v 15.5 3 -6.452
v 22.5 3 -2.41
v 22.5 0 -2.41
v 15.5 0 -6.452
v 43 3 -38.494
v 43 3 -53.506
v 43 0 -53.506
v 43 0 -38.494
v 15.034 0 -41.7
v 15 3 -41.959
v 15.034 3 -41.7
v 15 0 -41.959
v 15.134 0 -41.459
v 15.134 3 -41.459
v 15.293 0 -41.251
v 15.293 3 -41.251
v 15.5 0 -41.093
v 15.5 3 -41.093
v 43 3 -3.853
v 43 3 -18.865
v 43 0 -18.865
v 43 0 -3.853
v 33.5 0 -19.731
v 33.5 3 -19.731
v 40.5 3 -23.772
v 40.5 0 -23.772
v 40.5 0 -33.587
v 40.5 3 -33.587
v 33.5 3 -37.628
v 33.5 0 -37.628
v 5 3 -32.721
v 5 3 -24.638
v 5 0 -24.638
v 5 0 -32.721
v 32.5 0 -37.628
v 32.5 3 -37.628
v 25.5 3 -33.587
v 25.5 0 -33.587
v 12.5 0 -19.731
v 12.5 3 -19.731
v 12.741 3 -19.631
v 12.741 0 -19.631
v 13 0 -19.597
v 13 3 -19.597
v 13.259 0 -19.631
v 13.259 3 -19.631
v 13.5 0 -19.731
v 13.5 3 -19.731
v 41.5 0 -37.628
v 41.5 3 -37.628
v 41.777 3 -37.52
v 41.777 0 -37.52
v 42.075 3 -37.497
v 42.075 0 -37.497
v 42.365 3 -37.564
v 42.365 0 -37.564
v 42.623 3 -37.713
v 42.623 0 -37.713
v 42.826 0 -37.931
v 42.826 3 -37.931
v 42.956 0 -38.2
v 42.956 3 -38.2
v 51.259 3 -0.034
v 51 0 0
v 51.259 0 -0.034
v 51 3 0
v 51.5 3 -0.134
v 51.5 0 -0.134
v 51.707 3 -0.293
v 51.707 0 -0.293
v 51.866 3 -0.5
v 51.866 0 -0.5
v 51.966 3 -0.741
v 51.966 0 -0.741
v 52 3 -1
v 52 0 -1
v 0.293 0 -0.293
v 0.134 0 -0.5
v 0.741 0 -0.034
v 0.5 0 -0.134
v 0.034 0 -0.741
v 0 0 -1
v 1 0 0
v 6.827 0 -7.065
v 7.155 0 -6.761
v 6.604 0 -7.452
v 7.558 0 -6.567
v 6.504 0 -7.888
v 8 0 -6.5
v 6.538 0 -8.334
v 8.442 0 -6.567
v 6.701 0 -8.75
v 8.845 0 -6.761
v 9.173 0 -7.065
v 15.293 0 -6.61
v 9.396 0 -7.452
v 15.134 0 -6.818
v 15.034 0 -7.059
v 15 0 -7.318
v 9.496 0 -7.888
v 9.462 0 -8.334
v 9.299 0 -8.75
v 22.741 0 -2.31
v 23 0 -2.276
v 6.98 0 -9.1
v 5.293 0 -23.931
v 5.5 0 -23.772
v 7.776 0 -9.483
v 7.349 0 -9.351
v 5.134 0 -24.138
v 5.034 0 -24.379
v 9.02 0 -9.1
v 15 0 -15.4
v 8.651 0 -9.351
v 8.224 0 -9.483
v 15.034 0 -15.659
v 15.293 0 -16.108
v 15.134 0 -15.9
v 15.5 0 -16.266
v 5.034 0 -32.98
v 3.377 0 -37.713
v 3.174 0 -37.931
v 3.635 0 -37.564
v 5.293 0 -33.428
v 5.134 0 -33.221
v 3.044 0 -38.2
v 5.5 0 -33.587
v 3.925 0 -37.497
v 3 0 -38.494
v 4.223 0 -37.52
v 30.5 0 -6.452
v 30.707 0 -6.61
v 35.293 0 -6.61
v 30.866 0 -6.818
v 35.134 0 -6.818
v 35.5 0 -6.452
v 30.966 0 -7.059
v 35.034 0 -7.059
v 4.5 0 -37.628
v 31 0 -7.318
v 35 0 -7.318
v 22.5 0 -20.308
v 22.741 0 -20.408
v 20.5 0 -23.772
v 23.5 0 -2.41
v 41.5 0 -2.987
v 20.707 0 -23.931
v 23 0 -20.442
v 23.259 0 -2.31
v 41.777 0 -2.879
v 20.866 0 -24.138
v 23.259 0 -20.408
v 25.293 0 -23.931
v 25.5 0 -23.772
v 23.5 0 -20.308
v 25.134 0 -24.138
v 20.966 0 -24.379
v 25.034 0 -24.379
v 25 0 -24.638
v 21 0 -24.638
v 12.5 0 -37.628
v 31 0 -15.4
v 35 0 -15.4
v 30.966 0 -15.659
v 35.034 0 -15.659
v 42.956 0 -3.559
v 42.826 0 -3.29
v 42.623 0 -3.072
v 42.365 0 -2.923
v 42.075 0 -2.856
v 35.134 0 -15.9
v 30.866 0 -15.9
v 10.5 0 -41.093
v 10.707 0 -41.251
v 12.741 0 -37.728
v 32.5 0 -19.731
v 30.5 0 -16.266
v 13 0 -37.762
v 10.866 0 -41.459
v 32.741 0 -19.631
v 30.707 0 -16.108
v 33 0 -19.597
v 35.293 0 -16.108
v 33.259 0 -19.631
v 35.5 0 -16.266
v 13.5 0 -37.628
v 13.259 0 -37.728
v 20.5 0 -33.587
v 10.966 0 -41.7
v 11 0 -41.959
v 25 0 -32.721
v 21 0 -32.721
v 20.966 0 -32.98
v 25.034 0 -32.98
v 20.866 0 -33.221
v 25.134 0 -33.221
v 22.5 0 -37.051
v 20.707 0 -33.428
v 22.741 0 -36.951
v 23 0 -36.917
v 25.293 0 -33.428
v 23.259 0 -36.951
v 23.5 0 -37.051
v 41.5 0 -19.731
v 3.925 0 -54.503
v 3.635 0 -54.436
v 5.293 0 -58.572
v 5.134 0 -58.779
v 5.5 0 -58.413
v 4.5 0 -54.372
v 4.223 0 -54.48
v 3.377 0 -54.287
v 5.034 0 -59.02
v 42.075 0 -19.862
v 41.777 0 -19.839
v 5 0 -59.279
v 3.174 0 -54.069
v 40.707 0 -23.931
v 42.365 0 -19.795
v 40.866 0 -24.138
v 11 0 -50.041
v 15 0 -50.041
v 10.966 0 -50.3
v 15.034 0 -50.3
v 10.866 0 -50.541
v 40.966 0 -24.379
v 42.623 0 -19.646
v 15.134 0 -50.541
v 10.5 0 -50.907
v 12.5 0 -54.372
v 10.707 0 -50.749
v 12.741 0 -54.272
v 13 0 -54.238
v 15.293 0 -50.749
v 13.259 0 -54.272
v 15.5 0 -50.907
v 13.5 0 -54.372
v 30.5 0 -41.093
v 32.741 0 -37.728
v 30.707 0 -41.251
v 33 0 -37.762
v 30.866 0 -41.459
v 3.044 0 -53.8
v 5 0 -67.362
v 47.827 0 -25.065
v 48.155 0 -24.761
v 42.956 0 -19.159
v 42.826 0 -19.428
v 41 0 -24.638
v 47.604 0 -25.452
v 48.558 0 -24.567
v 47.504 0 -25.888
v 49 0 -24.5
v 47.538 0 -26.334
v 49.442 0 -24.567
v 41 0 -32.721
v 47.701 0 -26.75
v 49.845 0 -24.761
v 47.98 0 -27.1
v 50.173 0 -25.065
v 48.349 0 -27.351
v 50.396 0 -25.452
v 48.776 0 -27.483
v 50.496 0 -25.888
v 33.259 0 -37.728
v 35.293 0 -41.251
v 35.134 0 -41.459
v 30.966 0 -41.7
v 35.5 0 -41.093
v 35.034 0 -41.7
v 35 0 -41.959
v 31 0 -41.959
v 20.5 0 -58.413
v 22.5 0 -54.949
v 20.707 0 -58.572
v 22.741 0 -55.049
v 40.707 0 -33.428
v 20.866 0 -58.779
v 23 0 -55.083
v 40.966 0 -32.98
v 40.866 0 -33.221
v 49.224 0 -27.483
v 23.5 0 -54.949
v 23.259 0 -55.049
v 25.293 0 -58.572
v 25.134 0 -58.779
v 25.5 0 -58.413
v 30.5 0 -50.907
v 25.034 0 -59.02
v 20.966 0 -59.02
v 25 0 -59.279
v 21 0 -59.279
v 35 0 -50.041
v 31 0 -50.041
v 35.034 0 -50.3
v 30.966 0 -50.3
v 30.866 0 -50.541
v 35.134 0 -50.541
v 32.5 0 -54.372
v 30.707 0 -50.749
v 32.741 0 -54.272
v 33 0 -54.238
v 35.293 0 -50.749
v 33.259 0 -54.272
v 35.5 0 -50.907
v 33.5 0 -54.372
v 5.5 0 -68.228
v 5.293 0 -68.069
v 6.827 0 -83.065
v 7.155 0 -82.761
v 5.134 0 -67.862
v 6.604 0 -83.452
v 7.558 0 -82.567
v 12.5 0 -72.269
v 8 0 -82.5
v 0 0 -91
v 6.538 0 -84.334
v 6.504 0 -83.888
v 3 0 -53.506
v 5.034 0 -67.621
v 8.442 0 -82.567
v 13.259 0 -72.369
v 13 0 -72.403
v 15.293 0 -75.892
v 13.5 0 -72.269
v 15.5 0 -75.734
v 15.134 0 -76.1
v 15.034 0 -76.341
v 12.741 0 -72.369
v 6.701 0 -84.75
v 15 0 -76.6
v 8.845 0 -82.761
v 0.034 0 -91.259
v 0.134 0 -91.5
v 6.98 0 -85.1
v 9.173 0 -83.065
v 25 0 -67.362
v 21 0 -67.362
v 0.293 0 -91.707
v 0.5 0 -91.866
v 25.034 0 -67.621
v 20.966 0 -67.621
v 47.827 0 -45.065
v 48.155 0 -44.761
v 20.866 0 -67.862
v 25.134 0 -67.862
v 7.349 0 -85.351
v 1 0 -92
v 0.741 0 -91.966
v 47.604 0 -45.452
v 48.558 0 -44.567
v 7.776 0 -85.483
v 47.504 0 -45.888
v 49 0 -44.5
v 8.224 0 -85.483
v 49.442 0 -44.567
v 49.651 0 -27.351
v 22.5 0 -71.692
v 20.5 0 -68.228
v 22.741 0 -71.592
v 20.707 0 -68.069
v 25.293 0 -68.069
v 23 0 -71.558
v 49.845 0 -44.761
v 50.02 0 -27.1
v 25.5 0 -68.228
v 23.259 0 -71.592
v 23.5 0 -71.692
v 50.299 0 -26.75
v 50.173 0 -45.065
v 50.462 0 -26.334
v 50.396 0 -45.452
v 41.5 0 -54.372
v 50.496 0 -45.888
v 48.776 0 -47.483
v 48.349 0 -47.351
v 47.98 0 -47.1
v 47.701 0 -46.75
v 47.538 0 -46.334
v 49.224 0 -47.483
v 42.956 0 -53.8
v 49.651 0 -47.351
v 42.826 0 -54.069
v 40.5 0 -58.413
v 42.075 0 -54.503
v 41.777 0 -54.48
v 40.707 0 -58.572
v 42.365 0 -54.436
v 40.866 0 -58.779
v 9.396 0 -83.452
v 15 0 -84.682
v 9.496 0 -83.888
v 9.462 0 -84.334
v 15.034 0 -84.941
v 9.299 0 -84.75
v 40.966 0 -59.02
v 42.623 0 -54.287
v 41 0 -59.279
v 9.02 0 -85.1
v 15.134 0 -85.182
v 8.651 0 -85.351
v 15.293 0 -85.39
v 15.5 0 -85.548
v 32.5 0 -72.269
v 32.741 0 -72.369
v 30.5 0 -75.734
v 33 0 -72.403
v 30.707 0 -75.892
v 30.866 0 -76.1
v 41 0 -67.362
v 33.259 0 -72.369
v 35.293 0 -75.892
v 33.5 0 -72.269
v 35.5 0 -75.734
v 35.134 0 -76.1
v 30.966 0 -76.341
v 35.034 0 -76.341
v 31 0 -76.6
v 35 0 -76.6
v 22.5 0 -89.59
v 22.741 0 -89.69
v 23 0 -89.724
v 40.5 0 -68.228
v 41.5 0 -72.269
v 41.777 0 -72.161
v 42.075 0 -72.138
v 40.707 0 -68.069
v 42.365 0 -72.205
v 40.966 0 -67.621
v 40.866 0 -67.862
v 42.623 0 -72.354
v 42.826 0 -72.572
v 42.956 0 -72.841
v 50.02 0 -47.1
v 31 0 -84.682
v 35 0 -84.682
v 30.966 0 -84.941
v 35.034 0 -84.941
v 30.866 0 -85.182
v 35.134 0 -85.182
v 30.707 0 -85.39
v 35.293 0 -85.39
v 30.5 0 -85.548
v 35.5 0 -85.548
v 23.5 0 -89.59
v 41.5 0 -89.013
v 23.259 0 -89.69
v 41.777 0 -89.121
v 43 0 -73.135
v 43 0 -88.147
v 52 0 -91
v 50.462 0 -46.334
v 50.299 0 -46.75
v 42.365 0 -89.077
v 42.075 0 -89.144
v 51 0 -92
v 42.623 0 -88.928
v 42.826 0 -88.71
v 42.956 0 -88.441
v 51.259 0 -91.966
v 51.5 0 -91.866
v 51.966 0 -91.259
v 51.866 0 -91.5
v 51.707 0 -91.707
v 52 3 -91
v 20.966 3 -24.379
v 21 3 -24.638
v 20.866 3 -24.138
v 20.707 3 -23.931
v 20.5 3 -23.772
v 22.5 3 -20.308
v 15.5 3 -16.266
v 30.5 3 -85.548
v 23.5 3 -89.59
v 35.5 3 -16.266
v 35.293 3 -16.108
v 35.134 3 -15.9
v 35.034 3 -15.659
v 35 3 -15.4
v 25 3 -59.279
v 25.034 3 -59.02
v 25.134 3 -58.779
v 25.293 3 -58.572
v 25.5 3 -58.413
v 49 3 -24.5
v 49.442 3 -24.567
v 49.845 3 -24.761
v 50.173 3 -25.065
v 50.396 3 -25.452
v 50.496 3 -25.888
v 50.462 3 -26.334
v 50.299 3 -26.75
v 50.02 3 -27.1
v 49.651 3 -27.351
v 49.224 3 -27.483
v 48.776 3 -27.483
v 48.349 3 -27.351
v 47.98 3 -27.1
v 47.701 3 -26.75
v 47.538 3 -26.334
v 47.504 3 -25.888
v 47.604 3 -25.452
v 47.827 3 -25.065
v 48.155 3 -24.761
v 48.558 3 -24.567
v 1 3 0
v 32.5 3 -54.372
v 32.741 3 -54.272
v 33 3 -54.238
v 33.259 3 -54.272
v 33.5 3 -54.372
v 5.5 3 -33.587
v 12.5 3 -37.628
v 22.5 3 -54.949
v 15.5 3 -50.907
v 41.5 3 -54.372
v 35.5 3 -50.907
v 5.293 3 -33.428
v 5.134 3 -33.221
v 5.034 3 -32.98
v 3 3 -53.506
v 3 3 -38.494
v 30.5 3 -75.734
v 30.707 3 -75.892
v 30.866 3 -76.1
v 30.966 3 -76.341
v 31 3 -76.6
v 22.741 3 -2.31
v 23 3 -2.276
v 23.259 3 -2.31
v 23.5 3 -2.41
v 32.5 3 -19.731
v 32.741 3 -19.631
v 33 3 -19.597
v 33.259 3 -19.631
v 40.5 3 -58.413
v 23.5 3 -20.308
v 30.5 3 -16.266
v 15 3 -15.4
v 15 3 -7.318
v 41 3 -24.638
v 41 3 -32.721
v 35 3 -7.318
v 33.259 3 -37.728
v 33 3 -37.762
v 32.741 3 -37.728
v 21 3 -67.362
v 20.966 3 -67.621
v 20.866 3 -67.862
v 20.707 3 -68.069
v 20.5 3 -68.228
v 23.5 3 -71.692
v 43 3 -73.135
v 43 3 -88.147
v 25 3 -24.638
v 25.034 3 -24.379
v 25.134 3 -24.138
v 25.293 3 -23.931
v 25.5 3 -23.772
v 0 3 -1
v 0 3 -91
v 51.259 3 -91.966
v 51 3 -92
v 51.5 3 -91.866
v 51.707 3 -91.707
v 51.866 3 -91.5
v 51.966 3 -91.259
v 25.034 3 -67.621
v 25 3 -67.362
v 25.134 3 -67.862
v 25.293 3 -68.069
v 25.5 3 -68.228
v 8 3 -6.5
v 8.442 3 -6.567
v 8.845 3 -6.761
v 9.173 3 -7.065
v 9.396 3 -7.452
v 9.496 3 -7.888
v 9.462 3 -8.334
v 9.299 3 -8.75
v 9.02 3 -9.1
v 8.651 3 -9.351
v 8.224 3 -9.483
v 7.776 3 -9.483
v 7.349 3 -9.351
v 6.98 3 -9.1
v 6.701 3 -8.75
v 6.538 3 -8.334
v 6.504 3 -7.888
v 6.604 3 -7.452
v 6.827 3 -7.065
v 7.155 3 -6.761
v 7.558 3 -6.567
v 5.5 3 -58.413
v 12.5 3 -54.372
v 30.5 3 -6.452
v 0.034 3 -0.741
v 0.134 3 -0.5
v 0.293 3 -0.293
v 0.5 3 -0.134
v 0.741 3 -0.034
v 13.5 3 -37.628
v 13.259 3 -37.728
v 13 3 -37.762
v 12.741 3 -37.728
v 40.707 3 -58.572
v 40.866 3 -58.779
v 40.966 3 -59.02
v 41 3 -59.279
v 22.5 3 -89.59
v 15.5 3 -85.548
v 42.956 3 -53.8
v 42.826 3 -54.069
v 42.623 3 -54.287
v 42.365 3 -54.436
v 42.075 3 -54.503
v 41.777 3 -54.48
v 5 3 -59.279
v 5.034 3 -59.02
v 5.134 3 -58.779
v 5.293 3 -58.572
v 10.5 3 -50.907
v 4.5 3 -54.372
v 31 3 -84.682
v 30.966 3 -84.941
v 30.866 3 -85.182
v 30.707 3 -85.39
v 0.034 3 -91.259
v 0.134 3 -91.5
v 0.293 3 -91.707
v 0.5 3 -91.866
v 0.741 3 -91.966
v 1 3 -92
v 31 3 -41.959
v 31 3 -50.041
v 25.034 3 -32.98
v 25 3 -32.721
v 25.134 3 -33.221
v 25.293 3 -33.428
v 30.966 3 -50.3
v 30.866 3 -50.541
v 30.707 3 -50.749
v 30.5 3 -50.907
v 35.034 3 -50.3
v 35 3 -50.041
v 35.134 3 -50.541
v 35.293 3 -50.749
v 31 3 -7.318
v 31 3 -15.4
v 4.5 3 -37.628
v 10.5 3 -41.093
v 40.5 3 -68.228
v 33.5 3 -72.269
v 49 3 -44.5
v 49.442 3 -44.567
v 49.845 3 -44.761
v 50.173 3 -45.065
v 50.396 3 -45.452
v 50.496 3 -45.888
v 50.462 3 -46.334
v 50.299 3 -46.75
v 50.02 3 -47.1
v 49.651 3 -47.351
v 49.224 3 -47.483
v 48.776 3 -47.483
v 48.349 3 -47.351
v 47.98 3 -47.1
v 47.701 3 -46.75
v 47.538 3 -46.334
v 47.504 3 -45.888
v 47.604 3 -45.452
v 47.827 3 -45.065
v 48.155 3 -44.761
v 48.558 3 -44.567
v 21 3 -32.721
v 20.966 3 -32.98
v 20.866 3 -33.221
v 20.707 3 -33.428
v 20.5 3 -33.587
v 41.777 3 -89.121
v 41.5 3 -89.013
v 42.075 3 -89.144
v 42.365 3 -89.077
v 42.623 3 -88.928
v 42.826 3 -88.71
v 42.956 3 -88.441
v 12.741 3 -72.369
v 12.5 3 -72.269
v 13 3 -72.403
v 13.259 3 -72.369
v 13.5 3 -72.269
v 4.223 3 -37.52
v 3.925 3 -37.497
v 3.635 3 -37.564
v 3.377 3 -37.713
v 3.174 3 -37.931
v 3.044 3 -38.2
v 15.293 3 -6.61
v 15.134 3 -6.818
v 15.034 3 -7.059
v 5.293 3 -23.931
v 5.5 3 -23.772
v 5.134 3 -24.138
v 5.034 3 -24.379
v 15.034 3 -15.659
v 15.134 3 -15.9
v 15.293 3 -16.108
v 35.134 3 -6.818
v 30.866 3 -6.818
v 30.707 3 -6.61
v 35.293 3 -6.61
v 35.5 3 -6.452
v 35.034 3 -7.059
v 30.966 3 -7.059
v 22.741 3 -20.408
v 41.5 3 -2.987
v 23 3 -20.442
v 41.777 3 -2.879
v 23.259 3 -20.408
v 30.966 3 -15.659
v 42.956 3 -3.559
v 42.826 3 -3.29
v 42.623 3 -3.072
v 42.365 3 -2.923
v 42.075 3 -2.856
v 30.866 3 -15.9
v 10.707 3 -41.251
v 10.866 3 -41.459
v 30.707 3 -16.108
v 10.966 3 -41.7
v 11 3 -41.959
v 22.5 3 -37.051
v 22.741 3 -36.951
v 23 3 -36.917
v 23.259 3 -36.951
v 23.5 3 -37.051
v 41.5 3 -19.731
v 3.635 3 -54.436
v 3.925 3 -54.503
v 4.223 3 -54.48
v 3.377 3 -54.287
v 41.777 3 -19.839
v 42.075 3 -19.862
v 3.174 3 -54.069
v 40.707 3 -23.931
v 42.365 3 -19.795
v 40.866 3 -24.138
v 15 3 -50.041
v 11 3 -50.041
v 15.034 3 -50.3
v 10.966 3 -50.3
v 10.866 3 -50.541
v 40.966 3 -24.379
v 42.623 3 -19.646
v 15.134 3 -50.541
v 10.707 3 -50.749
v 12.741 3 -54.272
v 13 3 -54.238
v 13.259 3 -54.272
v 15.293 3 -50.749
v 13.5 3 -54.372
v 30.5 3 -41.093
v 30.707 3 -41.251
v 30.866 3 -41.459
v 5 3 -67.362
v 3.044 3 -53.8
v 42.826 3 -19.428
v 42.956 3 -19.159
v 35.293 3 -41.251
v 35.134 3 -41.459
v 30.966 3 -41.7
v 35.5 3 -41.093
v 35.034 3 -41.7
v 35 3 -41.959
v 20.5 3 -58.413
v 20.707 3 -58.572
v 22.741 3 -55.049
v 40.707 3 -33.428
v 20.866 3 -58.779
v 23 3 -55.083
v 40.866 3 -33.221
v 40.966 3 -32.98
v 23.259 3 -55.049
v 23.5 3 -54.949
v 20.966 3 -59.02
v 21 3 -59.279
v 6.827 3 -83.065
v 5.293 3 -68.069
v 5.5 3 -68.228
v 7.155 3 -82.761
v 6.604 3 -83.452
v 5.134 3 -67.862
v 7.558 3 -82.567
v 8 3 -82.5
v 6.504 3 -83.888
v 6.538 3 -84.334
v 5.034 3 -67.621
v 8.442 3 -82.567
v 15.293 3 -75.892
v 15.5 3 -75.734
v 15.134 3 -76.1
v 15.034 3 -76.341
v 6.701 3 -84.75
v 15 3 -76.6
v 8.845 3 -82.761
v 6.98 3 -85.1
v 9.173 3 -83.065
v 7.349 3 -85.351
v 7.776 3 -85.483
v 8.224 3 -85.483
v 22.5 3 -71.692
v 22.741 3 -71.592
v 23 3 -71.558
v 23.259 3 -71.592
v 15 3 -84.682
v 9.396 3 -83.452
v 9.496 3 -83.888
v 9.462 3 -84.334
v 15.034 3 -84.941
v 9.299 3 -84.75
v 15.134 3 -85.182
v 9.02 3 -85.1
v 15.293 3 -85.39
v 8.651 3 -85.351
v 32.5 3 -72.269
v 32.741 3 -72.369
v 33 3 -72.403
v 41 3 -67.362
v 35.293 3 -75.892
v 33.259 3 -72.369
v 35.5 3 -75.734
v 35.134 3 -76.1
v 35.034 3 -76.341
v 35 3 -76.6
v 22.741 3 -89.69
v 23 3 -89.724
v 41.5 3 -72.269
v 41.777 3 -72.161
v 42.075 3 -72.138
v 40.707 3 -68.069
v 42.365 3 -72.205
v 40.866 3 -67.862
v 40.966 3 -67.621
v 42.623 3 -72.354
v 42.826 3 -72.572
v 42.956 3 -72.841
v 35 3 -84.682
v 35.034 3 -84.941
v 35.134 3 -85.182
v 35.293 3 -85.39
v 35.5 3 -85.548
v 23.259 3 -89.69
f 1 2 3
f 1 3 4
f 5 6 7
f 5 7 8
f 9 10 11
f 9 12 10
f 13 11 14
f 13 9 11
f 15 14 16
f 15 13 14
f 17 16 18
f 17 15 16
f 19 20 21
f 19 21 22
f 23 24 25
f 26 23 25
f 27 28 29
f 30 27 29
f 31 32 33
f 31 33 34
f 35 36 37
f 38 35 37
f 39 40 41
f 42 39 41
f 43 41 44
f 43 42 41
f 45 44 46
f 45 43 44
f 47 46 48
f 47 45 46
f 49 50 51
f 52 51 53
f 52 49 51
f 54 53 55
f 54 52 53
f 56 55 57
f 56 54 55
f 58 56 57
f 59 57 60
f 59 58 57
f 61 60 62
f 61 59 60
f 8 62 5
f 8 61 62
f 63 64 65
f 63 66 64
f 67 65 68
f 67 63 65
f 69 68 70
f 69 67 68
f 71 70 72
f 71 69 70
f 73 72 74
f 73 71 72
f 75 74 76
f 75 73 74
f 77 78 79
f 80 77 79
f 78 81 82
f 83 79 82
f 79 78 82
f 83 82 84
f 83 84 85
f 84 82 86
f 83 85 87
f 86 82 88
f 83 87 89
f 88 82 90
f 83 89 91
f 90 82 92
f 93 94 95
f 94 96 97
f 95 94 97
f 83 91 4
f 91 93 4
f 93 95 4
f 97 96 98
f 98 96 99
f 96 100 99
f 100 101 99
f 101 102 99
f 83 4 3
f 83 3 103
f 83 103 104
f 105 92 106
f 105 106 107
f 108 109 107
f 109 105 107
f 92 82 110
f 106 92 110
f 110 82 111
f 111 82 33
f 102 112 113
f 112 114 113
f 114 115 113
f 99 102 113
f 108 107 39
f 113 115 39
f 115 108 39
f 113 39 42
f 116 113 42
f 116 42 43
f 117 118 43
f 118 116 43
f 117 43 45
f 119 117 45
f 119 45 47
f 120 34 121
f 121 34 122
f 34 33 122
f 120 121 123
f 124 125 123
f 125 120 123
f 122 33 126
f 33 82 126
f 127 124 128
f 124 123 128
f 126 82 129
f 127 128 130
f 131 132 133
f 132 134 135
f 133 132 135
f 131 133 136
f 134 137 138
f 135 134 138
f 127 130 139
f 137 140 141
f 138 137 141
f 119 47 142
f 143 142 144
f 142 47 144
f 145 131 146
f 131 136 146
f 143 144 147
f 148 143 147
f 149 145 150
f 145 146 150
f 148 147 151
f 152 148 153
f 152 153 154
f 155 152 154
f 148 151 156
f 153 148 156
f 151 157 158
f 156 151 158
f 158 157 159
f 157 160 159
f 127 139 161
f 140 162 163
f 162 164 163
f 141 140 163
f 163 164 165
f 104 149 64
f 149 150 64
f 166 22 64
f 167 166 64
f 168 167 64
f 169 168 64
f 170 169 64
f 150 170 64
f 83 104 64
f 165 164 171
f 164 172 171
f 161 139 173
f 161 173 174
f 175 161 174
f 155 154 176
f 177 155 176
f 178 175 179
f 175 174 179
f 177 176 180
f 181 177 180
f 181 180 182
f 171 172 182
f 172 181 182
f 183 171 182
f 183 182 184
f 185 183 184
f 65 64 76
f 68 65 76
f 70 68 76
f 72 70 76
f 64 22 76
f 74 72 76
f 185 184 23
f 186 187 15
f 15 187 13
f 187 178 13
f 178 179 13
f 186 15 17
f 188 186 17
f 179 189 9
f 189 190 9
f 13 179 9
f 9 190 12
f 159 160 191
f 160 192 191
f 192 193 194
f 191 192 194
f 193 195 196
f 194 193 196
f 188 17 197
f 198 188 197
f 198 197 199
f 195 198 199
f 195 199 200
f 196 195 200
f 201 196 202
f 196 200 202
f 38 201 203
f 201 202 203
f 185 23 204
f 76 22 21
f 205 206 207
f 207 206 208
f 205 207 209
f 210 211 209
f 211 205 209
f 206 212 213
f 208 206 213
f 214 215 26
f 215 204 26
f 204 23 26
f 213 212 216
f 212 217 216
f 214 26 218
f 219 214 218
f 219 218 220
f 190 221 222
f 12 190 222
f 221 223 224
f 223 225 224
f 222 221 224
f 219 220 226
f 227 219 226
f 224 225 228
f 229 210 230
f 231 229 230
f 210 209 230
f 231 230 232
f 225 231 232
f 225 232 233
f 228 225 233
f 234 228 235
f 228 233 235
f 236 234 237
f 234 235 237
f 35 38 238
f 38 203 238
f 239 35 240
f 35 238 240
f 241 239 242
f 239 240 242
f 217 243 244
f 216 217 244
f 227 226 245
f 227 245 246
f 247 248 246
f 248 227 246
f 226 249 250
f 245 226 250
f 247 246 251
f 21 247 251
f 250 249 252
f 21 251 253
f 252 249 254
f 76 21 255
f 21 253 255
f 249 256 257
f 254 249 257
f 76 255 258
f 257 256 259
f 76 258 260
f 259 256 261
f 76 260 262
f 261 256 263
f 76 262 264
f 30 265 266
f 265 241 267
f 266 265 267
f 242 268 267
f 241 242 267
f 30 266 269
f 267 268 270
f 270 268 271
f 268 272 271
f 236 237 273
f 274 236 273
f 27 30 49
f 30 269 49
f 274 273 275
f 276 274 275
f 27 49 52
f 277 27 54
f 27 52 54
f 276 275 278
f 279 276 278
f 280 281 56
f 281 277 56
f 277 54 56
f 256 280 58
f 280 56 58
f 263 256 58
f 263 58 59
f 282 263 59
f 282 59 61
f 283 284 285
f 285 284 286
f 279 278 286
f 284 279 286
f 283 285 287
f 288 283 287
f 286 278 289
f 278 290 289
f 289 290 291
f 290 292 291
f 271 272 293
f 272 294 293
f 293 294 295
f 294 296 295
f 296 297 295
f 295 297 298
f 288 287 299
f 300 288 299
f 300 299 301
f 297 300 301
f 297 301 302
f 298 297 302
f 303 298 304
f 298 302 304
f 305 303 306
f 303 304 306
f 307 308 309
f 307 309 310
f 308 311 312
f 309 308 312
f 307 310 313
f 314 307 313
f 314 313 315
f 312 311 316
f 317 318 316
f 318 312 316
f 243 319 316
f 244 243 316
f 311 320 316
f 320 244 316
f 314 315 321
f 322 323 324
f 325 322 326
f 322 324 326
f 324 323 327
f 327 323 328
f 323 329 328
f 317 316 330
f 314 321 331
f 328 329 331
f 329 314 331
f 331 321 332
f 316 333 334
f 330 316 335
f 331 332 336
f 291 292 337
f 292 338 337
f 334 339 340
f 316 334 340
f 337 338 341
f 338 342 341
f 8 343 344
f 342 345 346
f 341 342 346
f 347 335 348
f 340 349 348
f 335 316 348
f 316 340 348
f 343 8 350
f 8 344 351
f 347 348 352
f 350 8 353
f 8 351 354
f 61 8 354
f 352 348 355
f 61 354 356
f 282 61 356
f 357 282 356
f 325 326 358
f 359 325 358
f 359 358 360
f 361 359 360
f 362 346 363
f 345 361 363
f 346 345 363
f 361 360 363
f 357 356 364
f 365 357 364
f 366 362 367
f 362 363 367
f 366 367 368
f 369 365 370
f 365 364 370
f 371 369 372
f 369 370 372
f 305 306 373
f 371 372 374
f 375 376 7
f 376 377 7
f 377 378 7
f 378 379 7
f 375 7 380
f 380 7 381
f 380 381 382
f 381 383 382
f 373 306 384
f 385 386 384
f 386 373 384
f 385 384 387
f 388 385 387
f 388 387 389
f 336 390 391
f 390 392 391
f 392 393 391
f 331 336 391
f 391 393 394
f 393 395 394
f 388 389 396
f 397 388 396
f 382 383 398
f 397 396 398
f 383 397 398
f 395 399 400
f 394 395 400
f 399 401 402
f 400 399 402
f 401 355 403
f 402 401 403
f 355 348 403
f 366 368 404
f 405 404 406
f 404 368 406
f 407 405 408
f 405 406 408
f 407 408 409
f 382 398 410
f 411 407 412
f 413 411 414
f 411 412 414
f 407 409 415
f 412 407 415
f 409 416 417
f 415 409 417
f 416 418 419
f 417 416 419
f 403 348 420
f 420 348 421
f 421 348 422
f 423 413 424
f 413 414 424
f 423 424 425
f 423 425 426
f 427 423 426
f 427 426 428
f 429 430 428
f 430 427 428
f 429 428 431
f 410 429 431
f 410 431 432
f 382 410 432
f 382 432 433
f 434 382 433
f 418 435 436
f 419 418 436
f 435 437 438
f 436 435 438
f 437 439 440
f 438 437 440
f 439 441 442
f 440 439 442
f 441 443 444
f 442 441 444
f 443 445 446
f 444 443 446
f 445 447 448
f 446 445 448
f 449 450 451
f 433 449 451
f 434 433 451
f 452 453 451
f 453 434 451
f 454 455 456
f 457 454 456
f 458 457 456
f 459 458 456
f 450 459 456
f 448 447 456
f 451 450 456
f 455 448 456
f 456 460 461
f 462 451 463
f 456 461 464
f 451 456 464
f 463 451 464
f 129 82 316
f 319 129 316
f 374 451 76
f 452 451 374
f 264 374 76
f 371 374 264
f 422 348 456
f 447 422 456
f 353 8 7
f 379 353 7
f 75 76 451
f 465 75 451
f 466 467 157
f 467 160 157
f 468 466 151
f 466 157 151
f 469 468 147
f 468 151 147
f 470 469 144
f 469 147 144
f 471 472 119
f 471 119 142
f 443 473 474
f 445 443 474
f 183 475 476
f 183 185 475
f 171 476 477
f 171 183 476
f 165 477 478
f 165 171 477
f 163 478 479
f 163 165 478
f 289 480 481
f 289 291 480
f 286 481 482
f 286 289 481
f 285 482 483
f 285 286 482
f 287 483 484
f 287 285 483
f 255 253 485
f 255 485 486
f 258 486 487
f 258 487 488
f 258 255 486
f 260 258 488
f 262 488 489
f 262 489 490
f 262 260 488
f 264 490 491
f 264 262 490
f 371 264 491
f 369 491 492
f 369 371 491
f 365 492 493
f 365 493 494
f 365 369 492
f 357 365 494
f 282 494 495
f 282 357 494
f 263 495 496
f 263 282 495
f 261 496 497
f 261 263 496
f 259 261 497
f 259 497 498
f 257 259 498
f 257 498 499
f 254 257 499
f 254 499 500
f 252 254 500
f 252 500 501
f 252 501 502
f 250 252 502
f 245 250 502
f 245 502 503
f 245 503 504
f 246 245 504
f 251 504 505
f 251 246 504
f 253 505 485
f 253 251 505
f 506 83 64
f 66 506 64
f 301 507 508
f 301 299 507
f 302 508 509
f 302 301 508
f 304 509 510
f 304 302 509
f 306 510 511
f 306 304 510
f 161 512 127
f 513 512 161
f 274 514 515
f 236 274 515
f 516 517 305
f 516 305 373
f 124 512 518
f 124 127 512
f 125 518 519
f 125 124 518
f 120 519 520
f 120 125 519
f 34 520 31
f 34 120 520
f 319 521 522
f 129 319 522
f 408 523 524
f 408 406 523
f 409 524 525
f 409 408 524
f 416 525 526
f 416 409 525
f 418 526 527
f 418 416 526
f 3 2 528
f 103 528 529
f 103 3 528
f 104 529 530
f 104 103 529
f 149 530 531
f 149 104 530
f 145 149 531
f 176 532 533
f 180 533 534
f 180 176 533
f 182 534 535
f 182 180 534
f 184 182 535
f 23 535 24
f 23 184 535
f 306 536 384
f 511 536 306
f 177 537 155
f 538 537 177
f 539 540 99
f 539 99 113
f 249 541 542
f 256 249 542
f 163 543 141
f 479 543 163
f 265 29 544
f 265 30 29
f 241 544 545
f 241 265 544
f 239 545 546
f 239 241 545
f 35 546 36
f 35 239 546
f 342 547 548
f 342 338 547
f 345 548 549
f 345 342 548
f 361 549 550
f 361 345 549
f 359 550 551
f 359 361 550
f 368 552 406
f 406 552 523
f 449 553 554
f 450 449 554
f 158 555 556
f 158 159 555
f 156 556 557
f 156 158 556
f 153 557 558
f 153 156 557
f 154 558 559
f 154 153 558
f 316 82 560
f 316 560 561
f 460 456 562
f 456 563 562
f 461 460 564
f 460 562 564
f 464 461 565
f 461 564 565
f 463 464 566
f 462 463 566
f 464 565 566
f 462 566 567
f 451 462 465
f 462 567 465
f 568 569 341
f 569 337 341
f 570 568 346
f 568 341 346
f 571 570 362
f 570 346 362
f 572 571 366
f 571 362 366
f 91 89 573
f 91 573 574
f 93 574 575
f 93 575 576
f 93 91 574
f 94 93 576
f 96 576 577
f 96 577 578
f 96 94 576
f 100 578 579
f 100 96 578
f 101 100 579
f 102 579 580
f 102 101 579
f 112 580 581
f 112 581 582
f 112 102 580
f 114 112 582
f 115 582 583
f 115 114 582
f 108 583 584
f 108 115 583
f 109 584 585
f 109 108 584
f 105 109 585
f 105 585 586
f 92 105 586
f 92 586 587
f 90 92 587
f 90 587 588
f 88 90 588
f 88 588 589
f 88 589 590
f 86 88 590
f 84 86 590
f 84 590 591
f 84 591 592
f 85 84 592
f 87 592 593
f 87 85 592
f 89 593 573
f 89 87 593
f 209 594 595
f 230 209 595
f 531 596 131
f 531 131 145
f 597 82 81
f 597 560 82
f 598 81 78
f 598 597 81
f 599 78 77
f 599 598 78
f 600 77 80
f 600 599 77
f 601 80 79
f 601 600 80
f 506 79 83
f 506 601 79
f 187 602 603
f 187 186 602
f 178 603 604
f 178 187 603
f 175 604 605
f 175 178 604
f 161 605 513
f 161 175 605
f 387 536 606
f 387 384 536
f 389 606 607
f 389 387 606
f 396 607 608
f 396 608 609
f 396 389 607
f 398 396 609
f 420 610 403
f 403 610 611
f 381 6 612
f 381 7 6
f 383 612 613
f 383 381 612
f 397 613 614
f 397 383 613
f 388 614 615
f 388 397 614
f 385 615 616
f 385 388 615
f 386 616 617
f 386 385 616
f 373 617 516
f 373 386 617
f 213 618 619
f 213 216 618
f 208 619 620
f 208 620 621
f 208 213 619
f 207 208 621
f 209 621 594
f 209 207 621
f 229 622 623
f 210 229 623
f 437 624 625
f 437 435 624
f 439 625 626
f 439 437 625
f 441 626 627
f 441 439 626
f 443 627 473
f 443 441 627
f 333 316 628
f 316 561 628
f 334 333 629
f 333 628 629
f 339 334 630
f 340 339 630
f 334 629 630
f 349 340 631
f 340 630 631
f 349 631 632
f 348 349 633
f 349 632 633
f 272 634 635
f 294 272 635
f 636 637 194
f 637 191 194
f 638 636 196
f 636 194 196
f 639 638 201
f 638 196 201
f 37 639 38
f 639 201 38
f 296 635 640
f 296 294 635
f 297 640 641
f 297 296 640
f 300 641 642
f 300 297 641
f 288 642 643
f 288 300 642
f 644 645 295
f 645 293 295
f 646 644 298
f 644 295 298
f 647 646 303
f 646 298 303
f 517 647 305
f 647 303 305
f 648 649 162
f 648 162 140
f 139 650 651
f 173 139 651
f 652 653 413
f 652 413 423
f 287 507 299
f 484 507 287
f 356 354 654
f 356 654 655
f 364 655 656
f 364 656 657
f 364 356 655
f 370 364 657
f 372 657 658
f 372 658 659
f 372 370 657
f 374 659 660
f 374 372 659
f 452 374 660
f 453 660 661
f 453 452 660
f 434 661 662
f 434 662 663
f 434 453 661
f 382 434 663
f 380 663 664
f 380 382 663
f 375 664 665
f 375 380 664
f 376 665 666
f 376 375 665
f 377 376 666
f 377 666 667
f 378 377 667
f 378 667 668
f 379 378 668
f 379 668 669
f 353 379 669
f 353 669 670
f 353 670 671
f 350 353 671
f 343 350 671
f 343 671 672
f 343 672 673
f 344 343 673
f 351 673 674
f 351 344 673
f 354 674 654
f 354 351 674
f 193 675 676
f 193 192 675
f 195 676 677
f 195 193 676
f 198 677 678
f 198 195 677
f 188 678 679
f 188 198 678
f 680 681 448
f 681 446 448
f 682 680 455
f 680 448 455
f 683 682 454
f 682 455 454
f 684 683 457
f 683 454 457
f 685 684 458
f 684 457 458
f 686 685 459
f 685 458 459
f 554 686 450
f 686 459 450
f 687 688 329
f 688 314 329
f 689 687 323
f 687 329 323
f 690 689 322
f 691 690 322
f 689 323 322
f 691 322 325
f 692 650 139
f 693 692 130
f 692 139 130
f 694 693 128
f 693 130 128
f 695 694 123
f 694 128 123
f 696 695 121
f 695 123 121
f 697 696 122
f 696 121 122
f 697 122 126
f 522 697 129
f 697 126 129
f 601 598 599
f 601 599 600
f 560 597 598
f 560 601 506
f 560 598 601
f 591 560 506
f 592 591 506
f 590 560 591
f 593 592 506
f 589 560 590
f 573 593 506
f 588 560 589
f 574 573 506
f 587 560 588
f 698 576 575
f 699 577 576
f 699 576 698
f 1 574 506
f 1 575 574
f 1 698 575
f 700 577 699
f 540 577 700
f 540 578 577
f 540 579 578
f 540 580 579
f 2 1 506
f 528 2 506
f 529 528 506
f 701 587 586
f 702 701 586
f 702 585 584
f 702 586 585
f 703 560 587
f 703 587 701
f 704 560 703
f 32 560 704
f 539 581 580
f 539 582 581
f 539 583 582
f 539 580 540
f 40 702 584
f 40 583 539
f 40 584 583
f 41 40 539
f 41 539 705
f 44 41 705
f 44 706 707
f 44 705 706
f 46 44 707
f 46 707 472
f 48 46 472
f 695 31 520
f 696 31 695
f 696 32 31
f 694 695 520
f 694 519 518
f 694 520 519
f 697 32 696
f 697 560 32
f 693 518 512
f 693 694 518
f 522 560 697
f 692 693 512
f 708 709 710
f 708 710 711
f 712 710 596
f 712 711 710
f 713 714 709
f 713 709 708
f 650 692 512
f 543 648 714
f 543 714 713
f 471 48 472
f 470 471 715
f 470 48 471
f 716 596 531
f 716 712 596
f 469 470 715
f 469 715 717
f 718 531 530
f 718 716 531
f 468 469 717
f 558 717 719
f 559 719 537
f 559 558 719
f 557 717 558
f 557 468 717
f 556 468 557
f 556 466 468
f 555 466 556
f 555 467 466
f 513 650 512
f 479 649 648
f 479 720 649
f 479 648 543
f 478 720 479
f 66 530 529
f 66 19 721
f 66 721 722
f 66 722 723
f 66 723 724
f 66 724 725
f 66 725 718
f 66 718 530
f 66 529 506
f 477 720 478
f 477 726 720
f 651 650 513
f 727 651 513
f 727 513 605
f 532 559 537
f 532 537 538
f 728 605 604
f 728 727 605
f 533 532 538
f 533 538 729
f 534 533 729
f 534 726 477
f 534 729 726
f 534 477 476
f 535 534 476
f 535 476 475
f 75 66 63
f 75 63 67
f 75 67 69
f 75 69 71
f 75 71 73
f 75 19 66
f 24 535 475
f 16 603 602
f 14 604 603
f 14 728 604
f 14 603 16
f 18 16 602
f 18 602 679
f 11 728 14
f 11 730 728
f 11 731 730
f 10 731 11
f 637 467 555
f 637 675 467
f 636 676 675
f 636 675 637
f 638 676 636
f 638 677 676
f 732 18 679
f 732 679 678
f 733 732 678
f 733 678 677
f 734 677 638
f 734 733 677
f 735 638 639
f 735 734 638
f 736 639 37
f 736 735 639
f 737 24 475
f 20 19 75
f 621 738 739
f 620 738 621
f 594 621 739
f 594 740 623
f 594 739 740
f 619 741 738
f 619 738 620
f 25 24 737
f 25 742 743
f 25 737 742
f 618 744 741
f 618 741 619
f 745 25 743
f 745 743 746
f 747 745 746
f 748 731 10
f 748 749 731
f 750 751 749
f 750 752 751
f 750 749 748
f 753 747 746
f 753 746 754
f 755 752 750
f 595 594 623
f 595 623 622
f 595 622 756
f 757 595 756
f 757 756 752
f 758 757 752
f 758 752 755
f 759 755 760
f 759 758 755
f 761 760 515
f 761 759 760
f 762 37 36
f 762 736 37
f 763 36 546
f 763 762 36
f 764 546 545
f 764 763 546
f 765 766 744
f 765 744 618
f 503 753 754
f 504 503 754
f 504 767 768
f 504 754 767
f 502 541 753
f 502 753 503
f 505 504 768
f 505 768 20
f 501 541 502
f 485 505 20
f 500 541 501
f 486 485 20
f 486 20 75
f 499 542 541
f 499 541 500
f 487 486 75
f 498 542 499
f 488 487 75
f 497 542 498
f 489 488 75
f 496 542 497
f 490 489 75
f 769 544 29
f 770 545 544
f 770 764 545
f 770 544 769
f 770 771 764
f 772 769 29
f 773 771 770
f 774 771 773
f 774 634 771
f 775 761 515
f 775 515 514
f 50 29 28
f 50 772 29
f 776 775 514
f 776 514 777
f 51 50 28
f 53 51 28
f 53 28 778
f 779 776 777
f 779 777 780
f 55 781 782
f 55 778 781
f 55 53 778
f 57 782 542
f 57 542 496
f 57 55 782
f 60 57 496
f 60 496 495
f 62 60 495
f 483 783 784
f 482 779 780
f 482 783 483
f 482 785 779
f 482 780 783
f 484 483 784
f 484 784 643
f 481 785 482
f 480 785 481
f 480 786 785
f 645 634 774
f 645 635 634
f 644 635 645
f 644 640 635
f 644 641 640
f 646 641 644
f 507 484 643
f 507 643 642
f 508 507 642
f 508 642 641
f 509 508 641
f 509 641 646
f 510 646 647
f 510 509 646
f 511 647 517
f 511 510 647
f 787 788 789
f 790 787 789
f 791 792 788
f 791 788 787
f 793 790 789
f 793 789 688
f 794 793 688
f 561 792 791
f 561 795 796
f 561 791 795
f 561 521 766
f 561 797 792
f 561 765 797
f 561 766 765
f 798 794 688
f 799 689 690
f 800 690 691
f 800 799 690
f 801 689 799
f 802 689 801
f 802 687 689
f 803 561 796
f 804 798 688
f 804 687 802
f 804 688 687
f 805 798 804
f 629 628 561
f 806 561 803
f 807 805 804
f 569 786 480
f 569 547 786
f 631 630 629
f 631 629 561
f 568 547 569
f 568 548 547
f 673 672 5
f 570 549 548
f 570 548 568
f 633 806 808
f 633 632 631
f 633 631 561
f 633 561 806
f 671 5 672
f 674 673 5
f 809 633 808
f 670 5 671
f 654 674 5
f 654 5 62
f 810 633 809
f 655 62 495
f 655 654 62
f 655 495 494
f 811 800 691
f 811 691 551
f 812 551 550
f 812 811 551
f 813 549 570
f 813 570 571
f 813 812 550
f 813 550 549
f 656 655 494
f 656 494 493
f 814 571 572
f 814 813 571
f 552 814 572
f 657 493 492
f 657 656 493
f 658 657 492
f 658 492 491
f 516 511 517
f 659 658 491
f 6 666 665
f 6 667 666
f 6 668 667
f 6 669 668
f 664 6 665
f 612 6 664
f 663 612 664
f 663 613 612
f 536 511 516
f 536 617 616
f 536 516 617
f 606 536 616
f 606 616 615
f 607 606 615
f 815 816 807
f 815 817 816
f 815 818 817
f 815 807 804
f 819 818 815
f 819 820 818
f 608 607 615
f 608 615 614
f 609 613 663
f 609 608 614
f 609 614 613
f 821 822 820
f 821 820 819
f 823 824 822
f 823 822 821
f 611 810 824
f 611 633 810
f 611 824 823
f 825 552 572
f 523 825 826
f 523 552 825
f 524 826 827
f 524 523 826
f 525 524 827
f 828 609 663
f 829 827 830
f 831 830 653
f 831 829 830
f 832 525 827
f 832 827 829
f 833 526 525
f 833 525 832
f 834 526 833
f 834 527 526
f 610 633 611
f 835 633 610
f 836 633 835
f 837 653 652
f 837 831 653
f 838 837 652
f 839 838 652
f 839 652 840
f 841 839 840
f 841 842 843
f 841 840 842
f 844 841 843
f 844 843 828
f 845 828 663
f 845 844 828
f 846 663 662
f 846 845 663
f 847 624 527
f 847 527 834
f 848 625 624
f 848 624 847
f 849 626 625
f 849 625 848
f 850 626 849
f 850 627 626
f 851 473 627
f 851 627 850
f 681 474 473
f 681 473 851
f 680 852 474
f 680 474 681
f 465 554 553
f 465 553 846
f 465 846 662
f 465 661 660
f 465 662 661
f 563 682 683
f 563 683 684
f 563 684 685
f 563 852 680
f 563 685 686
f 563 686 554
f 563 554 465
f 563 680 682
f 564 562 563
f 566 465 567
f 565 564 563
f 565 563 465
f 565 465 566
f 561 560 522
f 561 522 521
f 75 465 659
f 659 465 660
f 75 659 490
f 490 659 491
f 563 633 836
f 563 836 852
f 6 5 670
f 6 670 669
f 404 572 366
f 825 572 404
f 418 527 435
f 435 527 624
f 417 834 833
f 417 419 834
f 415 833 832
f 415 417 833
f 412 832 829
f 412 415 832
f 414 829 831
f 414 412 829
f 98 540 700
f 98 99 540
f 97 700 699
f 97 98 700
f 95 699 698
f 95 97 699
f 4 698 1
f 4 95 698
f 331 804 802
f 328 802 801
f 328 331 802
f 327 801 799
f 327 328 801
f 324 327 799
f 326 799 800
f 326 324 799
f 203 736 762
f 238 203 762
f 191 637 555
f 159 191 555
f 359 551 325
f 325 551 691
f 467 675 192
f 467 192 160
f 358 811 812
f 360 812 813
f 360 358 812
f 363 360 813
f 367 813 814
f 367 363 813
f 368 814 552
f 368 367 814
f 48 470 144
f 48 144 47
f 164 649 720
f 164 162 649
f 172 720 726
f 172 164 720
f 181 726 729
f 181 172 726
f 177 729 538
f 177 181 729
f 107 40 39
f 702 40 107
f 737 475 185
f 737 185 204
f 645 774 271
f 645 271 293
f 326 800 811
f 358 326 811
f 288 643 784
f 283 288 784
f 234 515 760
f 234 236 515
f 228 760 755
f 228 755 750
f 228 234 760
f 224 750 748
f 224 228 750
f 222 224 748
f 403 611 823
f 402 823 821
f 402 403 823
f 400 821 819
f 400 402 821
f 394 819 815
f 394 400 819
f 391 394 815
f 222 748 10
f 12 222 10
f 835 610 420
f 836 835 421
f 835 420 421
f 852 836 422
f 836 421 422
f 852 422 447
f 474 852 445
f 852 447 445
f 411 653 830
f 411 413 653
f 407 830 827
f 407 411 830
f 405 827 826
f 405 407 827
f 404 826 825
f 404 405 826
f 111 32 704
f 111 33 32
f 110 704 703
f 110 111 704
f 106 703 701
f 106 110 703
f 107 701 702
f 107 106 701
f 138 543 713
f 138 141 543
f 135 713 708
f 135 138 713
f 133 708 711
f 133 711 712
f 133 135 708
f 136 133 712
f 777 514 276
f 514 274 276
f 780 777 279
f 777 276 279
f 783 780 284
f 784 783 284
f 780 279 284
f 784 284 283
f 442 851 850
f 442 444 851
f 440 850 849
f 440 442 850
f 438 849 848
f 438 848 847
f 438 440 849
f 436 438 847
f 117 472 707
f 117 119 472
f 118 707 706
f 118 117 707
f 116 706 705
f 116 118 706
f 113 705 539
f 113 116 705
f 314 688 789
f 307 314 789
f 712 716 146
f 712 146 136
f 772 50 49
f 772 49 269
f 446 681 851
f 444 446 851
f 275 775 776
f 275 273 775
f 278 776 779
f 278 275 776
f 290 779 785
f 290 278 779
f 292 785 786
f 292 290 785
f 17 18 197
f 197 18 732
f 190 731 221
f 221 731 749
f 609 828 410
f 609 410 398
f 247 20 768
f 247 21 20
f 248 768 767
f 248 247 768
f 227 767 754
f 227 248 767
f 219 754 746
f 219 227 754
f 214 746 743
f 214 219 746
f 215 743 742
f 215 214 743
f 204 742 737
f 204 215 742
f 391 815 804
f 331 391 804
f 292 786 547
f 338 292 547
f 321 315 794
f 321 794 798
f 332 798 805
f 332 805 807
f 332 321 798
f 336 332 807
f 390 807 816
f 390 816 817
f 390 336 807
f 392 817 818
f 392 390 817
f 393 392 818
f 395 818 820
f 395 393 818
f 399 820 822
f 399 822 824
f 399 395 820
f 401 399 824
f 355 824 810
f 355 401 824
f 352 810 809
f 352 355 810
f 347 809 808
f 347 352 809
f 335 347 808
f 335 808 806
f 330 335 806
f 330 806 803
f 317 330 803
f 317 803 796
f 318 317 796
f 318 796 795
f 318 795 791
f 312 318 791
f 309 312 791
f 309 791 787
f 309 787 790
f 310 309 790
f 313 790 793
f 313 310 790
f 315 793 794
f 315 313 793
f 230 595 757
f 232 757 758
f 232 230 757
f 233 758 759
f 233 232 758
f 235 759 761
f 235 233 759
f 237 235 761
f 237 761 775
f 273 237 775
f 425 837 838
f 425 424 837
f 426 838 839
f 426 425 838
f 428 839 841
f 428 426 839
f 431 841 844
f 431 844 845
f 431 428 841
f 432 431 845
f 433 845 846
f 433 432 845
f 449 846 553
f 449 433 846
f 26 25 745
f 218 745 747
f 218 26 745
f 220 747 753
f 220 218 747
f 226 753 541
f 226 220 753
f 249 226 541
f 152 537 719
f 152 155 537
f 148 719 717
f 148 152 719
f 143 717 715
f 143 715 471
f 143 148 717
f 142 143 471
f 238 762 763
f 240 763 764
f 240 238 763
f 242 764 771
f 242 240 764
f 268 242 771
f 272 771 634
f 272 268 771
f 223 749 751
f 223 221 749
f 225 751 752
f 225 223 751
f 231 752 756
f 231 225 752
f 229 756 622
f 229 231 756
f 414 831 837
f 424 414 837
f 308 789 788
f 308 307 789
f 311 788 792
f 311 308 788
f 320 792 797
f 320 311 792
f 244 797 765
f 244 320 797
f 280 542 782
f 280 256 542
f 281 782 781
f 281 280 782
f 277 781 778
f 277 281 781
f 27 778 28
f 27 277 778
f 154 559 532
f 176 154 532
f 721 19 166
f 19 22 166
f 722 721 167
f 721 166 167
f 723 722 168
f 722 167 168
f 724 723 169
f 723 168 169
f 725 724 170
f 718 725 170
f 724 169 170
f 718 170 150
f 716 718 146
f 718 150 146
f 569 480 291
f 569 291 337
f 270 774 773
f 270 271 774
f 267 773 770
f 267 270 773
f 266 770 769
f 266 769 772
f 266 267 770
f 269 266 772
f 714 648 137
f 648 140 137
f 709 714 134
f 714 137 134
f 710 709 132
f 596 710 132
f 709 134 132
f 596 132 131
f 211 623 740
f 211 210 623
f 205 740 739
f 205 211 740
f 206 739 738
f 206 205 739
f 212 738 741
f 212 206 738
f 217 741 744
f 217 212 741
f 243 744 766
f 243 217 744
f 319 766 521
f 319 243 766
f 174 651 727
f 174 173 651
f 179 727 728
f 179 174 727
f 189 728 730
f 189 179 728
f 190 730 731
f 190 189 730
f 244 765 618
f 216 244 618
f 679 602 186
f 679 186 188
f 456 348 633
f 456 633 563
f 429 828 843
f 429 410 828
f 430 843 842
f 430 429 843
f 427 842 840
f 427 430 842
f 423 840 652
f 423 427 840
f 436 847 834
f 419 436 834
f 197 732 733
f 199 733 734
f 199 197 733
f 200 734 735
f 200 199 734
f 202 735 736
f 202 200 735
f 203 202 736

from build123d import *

# Parameters (mm, degrees)
SKETCH_1_W          = 52
SKETCH_1_H          = 92
SKETCH_1_R          = 1.5
EXTRUDE_1_DEPTH     = 3
FILLET_1_R          = 1
CUT_EXTRUDE_1_DEPTH = 10
FILLET_2_R          = 1


with BuildPart() as part:
    # 草图1 → 凸台-拉伸1 (new body)
    with BuildSketch(Plane(origin=(0, 0, 0), x_dir=(1, 0, 0), z_dir=(0, 1, 0))):
        with Locations((26, 46)):
            Rectangle(SKETCH_1_W, SKETCH_1_H)
        with Locations(Location((49, 46, 0), (0, 0, 270))):
            Circle(SKETCH_1_R, mode=Mode.SUBTRACT)
        with Locations(Location((49, 26, 0), (0, 0, 270))):
            Circle(SKETCH_1_R, mode=Mode.SUBTRACT)
        with Locations(Location((8, 84, 0), (0, 0, 270))):
            Circle(SKETCH_1_R, mode=Mode.SUBTRACT)
        with Locations(Location((8, 8, 0), (0, 0, 270))):
            Circle(SKETCH_1_R, mode=Mode.SUBTRACT)
    extrude(amount=EXTRUDE_1_DEPTH)

    # 圆角1
    fillet_1_edges = [part.edges().sort_by_distance(p)[0] for p in [
        (0, 1.5, -92),
        (52, 1.5, -92),
        (52, 1.5, 0),
        (0, 1.5, 0),
    ]]
    fillet(fillet_1_edges, radius=FILLET_1_R)

    # 草图2 → 切除-拉伸1 (cut)
    with BuildSketch(Plane(origin=(0, 3, 0), x_dir=(1, 0, 0), z_dir=(0, 1, 0))):
        Polygon((23, 89.878620458), (15, 85.259818305), (15, 76.022213998), (23, 71.403411844), (31, 76.022213998), (31, 85.259818305), align=None)
        Polygon((13, 72.558112383), (5, 67.939310229), (5, 58.701705922), (13, 54.082903769), (21, 58.701705922), (21, 67.939310229), align=None)
        Polygon((43, 89.878620458), (35, 85.259818305), (35, 76.022213998), (43, 71.403411844), align=None)
        Polygon((23, 55.237604307), (15, 50.618802154), (15, 41.381197846), (23, 36.762395693), (31, 41.381197846), (31, 50.618802154), align=None)
        Polygon((3, 36.762395693), (11, 41.381197846), (11, 50.618802154), (3, 55.237604307), align=None)
        Polygon((35, 50.618802154), (43, 55.237604307), (43, 36.762395693), (35, 41.381197846), align=None)
        Polygon((25, 67.939310229), (33, 72.558112383), (41, 67.939310229), (41, 58.701705922), (33, 54.082903769), (25, 58.701705922), align=None)
        Polygon((21, 24.060689771), (13, 19.441887617), (5, 24.060689771), (5, 33.298294078), (13, 37.917096231), (21, 33.298294078), align=None)
        Polygon((25, 33.298294078), (25, 24.060689771), (33, 19.441887617), (41, 24.060689771), (41, 33.298294078), (33, 37.917096231), align=None)
        Polygon((43, 2.121379542), (35, 6.740181695), (35, 15.977786002), (43, 20.596588156), align=None)
        Polygon((31, 6.740181695), (23, 2.121379542), (15, 6.740181695), (15, 15.977786002), (23, 20.596588156), (31, 15.977786002), align=None)
    extrude(amount=-CUT_EXTRUDE_1_DEPTH, mode=Mode.SUBTRACT)

    # 圆角2
    fillet_2_edges = [part.edges().sort_by_distance(p)[0] for p in [
        (23, 1.5, -55.237604307),
        (31, 1.5, -50.618802154),
        (31, 1.5, -41.381197846),
        (23, 1.5, -36.762395693),
        (15, 1.5, -41.381197846),
        (15, 1.5, -50.618802154),
        (25, 1.5, -58.701705922),
        (25, 1.5, -67.939310229),
        (33, 1.5, -72.558112383),
        (41, 1.5, -67.939310229),
        (41, 1.5, -58.701705922),
        (33, 1.5, -54.082903769),
        (3, 1.5, -36.762395693),
        (3, 1.5, -55.237604307),
        (11, 1.5, -50.618802154),
        (11, 1.5, -41.381197846),
        (25, 1.5, -33.298294078),
        (33, 1.5, -37.917096231),
        (41, 1.5, -33.298294078),
        (41, 1.5, -24.060689771),
        (33, 1.5, -19.441887617),
        (25, 1.5, -24.060689771),
        (13, 1.5, -72.558112383),
        (21, 1.5, -67.939310229),
        (21, 1.5, -58.701705922),
        (13, 1.5, -54.082903769),
        (5, 1.5, -58.701705922),
        (5, 1.5, -67.939310229),
        (43, 1.5, -89.878620458),
        (43, 1.5, -71.403411844),
        (35, 1.5, -76.022213998),
        (35, 1.5, -85.259818305),
        (21, 1.5, -33.298294078),
        (21, 1.5, -24.060689771),
        (13, 1.5, -19.441887617),
        (5, 1.5, -24.060689771),
        (5, 1.5, -33.298294078),
        (13, 1.5, -37.917096231),
        (35, 1.5, -41.381197846),
        (35, 1.5, -50.618802154),
        (43, 1.5, -55.237604307),
        (43, 1.5, -36.762395693),
        (43, 1.5, -20.596588156),
        (43, 1.5, -2.121379542),
        (35, 1.5, -6.740181695),
        (35, 1.5, -15.977786002),
        (31, 1.5, -15.977786002),
        (31, 1.5, -6.740181695),
        (23, 1.5, -2.121379542),
        (15, 1.5, -6.740181695),
        (15, 1.5, -15.977786002),
        (23, 1.5, -20.596588156),
        (23, 1.5, -89.878620458),
        (31, 1.5, -85.259818305),
        (31, 1.5, -76.022213998),
        (23, 1.5, -71.403411844),
        (15, 1.5, -76.022213998),
        (15, 1.5, -85.259818305),
    ]]
    fillet(fillet_2_edges, radius=FILLET_2_R)


solid = part.part
